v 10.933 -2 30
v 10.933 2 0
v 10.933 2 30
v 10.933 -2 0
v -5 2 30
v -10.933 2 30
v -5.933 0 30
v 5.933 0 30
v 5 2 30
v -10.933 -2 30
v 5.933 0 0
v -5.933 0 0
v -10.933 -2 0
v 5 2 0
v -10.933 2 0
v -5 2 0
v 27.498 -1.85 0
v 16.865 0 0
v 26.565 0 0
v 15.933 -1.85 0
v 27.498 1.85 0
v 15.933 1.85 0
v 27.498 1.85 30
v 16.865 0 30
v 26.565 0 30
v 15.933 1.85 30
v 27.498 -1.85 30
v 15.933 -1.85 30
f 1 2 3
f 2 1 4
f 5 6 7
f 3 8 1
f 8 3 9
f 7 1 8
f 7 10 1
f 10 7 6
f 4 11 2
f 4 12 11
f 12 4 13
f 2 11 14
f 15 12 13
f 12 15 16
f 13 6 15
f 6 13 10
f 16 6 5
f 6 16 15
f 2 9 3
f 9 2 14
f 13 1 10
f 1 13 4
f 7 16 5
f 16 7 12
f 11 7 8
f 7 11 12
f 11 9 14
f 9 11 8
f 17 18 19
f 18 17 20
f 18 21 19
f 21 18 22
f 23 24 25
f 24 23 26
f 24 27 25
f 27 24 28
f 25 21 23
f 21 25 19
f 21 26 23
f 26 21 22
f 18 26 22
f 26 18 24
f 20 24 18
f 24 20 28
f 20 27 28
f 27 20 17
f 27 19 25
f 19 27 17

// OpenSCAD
// Connector Fit Test Piece
// A short wall section with dovetail track + a matching connector strip.
// Print both flat, then slide the strip into the wall groove to test fit.
// Units: millimeters
//
// Parameters match shelf.scad and shelf_connector.scad

// --- Track Parameters (must match shelf.scad) ---
track_width    = 10;
track_depth    = 2;
dovetail_angle = 25;
wall           = 4;

// --- FDM Tolerances (must match shelf_connector.scad) ---
clearance = 0.15;

// --- Test Piece Size ---
test_length = 30;  // sliding direction — enough to check fit

// --- Derived ---
dovetail_extra = track_depth * tan(dovetail_angle);
half_thickness = track_depth - clearance;
narrow_half_w  = (track_width - 2 * clearance) / 2;
wide_half_w    = narrow_half_w + dovetail_extra;

// Margin around the groove so the wall section is structurally sound
wall_section_width = track_width + 2 * dovetail_extra + 10;

$fn = 180;

// --- Wall section with dovetail groove ---
module wall_section() {
    difference() {
        // Solid block representing a chunk of shelf wall
        translate([-wall_section_width / 2, -wall / 2, 0])
            cube([wall_section_width, wall, test_length]);

        // Dovetail groove cut into the outer face (y = wall/2 side)
        linear_extrude(height = test_length)
            polygon([
                [-track_width / 2,                  wall / 2],
                [ track_width / 2,                  wall / 2],
                [ track_width / 2 + dovetail_extra, wall / 2 - track_depth],
                [-track_width / 2 - dovetail_extra, wall / 2 - track_depth]
            ]);
    }
}

// --- Short connector strip (bowtie cross-section) ---
module connector_strip() {
    linear_extrude(height = test_length)
        polygon([
            [-wide_half_w,   -half_thickness],
            [ wide_half_w,   -half_thickness],
            [ narrow_half_w,  0],
            [ wide_half_w,    half_thickness],
            [-wide_half_w,    half_thickness],
            [-narrow_half_w,  0]
        ]);
}

// Lay out side by side for printing
wall_section();

translate([wall_section_width / 2 + wide_half_w + 5, 0, 0])
    connector_strip();
